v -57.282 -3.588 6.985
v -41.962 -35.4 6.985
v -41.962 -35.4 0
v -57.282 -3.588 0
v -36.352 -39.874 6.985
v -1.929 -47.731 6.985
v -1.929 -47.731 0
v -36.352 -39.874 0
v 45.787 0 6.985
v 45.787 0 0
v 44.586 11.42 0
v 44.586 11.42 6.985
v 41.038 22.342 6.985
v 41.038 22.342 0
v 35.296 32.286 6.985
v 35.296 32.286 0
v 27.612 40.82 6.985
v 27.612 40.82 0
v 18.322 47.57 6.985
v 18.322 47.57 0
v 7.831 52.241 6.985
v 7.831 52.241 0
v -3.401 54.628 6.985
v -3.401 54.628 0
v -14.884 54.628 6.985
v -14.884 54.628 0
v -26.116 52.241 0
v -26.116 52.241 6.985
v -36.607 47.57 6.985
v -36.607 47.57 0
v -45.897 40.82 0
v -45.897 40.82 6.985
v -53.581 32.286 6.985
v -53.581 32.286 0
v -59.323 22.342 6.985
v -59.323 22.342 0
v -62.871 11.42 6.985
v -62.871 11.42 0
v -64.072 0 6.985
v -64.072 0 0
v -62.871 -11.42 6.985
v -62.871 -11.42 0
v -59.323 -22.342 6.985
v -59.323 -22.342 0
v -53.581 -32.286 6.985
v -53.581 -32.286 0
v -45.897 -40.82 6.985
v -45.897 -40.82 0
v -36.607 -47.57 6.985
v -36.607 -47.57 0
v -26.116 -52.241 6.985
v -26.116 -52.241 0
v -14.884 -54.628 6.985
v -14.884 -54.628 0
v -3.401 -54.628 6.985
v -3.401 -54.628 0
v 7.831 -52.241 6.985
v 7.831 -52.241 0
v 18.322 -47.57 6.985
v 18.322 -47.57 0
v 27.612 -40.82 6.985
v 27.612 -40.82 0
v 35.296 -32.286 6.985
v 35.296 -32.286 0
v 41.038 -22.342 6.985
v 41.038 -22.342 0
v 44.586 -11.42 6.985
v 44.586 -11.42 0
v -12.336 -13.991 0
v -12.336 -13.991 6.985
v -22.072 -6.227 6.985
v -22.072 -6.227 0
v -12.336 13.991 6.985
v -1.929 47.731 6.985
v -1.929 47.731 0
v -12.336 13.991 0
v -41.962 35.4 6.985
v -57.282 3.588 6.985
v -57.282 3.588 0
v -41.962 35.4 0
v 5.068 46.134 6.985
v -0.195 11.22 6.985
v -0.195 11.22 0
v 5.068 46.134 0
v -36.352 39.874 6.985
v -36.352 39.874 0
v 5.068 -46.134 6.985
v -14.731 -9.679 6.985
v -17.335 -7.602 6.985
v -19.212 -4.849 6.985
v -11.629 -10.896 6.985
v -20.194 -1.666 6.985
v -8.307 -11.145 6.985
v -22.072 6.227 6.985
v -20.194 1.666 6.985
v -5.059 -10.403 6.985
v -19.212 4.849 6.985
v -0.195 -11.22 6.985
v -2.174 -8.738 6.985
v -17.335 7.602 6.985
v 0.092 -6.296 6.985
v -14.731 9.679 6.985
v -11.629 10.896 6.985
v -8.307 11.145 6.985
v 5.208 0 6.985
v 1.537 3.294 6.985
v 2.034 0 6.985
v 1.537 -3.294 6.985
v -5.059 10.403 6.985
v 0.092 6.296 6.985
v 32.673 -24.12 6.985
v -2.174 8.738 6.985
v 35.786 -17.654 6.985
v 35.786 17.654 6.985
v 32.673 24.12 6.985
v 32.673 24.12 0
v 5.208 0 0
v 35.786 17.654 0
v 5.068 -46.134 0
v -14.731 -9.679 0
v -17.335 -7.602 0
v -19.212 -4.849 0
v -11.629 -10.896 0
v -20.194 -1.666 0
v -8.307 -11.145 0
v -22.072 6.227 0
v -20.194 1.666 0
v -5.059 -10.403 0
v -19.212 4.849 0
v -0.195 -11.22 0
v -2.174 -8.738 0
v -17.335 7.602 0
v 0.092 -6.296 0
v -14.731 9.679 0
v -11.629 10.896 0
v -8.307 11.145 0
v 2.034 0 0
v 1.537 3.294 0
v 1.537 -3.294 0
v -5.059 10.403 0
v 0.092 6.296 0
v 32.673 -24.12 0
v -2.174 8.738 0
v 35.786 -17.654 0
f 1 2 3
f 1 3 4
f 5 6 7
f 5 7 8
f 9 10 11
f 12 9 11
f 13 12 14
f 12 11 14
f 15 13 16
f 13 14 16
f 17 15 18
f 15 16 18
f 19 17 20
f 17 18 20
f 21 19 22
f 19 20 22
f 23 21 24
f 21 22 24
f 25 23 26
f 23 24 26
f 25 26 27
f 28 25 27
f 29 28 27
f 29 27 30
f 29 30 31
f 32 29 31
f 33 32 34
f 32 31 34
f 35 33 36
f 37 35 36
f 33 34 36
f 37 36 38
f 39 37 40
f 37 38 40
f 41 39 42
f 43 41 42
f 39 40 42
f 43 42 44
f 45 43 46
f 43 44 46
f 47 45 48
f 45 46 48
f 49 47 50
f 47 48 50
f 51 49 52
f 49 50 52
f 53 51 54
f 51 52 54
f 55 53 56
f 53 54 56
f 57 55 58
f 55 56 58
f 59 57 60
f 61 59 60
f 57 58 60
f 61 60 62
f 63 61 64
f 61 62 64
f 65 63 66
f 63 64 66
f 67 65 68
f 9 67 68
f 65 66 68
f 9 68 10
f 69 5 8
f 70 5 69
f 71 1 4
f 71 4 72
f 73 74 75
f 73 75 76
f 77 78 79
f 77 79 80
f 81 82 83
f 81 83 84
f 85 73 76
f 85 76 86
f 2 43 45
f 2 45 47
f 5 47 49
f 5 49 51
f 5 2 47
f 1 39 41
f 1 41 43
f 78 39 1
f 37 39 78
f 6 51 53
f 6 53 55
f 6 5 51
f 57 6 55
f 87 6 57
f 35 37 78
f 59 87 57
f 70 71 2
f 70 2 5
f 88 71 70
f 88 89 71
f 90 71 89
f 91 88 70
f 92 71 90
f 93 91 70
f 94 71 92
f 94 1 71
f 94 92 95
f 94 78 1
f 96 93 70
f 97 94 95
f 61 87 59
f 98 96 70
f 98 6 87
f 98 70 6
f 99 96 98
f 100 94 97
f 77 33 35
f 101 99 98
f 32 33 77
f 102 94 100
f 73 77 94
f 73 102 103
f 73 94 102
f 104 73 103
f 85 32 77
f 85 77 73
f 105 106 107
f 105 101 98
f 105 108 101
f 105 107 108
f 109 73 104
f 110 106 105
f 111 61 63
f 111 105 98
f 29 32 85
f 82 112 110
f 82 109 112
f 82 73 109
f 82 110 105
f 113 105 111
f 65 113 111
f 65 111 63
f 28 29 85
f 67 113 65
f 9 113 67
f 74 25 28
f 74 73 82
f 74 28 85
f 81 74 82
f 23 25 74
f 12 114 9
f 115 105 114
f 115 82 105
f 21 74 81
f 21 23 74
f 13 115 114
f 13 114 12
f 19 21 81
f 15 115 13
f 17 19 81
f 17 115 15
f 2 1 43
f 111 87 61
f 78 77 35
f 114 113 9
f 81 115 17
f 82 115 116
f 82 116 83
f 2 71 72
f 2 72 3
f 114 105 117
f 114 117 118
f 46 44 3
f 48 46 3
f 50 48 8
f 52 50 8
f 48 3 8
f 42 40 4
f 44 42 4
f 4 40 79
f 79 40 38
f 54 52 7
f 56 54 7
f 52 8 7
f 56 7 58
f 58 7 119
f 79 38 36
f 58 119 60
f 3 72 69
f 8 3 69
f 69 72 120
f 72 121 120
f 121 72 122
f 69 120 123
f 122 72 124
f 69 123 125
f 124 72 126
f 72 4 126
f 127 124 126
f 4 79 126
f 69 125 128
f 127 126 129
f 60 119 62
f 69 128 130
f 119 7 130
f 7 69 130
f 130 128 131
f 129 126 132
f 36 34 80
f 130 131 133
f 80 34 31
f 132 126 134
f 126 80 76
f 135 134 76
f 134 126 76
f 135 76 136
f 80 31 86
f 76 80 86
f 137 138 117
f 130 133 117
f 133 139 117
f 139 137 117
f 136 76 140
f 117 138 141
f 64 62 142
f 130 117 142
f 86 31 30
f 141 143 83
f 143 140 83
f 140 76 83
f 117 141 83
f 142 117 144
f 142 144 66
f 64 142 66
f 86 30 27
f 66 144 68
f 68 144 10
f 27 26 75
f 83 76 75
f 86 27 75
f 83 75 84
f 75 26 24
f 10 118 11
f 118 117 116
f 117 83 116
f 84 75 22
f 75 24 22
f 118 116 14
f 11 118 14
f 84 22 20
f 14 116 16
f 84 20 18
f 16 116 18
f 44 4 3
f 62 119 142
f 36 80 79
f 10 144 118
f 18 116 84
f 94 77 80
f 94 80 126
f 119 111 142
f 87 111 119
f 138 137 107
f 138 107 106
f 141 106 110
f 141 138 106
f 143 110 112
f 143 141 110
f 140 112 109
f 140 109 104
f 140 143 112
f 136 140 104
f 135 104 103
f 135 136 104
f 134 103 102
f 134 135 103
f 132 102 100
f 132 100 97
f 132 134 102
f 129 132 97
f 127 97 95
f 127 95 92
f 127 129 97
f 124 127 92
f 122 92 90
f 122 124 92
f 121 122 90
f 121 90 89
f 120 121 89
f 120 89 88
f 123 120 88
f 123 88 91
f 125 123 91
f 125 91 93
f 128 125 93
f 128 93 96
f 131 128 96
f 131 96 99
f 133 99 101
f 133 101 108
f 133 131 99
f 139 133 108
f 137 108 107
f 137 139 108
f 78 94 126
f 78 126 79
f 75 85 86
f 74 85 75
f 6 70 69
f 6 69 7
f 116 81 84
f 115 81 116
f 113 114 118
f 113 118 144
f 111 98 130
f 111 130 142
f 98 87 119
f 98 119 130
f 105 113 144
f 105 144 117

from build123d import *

# Parameters (mm, degrees)
SKETCH1_R           = 54.929
SKETCH1_R_2         = 11.176
BOSS_EXTRUDE1_DEPTH = 6.985
CUT_EXTRUDE1_DEPTH  = 6.985


with BuildPart() as part:
    # Sketch1 → Boss-Extrude1 (new body)
    with BuildSketch(Plane.XY):
        with Locations((-9.1425, 0)):
            Circle(SKETCH1_R)
        with Locations((-9.1425, 0)):
            Circle(SKETCH1_R_2, mode=Mode.SUBTRACT)
    extrude(amount=BOSS_EXTRUDE1_DEPTH)

    # Sketch2 → Cut-Extrude1 (cut)
    with BuildSketch(Plane.XY.offset(6.985)):
        Polygon((35.7865, -17.654216531), (5.2085, 0), (35.7865, 17.654216531), align=None)
        Polygon((5.067651025, -46.134130643), (-0.194797854, -11.220063605), (32.67289559, -24.119682709), align=None)
        Polygon((-36.351731506, -39.874103416), (-12.335897923, -13.991190468), (-1.928554578, -47.730968917), align=None)
        Polygon((-57.282007746, -3.588063033), (-22.072304223, -6.22666554), (-41.962252786, -35.399861997), align=None)
        Polygon((-41.962252786, 35.399861997), (-22.072304223, 6.22666554), (-57.282007746, 3.588063033), align=None)
        Polygon((-1.928554578, 47.730968917), (-12.335897923, 13.991190468), (-36.351731506, 39.874103416), align=None)
        Polygon((32.67289559, 24.119682709), (-0.194797854, 11.220063605), (5.067651025, 46.134130643), align=None)
    extrude(amount=-CUT_EXTRUDE1_DEPTH, mode=Mode.SUBTRACT)


solid = part.part
